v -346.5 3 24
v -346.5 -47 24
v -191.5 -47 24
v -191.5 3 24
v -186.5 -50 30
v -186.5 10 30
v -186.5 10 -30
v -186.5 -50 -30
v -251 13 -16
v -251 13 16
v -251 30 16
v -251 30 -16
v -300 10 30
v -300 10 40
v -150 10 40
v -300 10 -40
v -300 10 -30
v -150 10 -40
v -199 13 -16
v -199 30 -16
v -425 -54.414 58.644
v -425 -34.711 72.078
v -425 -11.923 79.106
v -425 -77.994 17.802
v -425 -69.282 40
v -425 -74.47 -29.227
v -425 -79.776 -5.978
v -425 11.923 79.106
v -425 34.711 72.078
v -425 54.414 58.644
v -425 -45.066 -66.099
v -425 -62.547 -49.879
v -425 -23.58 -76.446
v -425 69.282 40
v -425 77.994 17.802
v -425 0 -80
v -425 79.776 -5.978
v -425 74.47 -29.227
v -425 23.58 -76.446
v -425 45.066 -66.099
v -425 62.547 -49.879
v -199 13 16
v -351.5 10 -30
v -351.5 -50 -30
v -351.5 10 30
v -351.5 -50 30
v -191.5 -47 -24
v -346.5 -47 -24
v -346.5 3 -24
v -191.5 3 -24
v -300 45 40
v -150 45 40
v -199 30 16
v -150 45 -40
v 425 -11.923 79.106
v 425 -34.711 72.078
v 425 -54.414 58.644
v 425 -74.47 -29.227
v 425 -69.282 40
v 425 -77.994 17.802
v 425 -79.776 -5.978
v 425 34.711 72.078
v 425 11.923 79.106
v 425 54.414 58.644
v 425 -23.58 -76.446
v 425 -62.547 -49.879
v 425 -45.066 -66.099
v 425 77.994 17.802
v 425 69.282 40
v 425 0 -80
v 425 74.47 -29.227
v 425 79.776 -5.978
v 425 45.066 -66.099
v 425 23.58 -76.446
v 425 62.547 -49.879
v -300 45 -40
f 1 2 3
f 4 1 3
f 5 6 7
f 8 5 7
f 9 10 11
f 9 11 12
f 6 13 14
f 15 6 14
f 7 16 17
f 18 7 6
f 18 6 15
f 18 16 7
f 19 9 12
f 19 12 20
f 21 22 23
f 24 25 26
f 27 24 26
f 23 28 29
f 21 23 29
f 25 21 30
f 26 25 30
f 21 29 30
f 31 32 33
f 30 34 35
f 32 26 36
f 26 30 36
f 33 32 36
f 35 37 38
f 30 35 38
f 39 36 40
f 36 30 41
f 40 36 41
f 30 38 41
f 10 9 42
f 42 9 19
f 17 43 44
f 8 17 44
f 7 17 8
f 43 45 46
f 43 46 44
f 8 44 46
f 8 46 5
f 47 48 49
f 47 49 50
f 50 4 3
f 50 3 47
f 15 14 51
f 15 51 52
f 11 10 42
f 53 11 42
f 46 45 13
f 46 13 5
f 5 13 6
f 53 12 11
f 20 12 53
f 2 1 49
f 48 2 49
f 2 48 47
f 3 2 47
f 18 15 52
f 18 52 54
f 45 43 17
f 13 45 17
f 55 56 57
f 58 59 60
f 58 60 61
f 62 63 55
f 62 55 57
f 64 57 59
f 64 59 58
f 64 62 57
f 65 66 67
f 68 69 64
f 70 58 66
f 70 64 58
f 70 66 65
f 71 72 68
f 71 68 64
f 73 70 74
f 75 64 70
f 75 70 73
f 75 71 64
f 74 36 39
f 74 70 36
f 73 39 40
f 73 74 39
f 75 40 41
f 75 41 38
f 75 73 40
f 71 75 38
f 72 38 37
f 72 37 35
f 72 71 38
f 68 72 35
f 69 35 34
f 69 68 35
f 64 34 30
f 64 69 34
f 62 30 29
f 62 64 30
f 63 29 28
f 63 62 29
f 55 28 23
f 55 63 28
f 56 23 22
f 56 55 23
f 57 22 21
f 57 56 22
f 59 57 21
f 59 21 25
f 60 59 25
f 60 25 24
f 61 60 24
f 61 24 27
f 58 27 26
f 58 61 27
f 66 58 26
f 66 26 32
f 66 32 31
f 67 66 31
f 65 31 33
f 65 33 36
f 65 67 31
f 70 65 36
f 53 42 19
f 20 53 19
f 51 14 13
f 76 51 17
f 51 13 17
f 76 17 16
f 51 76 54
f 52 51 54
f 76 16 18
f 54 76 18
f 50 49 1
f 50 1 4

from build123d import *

# Parameters (mm, degrees)
SKETCH1_R          = 80
FOAMBODY_DEPTH     = 425
BATTERY_START      = 10
SKETCH2_W          = 165
SKETCH2_H          = 60
BATTERY_BAY_DEPTH  = 60
FOAM_START         = 10
SKETCH3_W          = 150
SKETCH3_H          = 80
FOAM_DEPTH         = 35
BATTERY_DEPTH      = 3
BATTERY_DEPTH_BACK = 47
SKETCH4_W          = 155
SKETCH4_H          = 48
FC_START           = 13
SKETCH5_W          = 52
SKETCH5_H          = 32
FC_DEPTH           = 17


with BuildPart() as part:
    # Sketch1 → FoamBody (new, symmetric)
    with BuildSketch(Plane(origin=(0, 0, 0), x_dir=(0, 0, -1), z_dir=(1, 0, 0))):
        Circle(SKETCH1_R)
    extrude(amount=FOAMBODY_DEPTH, both=True)

    # Sketch2 → battery bay (cut)
    with BuildSketch(Plane(origin=(0, 0, 0), x_dir=(1, 0, 0), z_dir=(0, 1, 0)).offset(BATTERY_START)):
        with Locations((-269, 0)):
            Rectangle(SKETCH2_W, SKETCH2_H)
    extrude(amount=-BATTERY_BAY_DEPTH, mode=Mode.SUBTRACT)

    # Sketch3 → Foam (cut)
    with BuildSketch(Plane(origin=(0, 0, 0), x_dir=(1, 0, 0), z_dir=(0, 1, 0)).offset(FOAM_START)):
        with Locations((-225, 0)):
            Rectangle(SKETCH3_W, SKETCH3_H)
    extrude(amount=FOAM_DEPTH, mode=Mode.SUBTRACT)


with BuildPart() as body_2:
    # Sketch4 → Battery (new, two sides: drawn at the far end of the back side and taken through both)
    with BuildSketch(Plane(origin=(0, 0, 0), x_dir=(1, 0, 0), z_dir=(0, 1, 0)).offset(-BATTERY_DEPTH_BACK)):
        with Locations((-269, 0)):
            Rectangle(SKETCH4_W, SKETCH4_H)
    extrude(amount=BATTERY_DEPTH + BATTERY_DEPTH_BACK)


with BuildPart() as body_3:
    # Sketch5 → FC (new body)
    with BuildSketch(Plane(origin=(0, 0, 0), x_dir=(1, 0, 0), z_dir=(0, 1, 0)).offset(FC_START)):
        with Locations((-225, 0)):
            Rectangle(SKETCH5_W, SKETCH5_H)
    extrude(amount=FC_DEPTH)


solid = Compound([part.part, body_2.part, body_3.part])
